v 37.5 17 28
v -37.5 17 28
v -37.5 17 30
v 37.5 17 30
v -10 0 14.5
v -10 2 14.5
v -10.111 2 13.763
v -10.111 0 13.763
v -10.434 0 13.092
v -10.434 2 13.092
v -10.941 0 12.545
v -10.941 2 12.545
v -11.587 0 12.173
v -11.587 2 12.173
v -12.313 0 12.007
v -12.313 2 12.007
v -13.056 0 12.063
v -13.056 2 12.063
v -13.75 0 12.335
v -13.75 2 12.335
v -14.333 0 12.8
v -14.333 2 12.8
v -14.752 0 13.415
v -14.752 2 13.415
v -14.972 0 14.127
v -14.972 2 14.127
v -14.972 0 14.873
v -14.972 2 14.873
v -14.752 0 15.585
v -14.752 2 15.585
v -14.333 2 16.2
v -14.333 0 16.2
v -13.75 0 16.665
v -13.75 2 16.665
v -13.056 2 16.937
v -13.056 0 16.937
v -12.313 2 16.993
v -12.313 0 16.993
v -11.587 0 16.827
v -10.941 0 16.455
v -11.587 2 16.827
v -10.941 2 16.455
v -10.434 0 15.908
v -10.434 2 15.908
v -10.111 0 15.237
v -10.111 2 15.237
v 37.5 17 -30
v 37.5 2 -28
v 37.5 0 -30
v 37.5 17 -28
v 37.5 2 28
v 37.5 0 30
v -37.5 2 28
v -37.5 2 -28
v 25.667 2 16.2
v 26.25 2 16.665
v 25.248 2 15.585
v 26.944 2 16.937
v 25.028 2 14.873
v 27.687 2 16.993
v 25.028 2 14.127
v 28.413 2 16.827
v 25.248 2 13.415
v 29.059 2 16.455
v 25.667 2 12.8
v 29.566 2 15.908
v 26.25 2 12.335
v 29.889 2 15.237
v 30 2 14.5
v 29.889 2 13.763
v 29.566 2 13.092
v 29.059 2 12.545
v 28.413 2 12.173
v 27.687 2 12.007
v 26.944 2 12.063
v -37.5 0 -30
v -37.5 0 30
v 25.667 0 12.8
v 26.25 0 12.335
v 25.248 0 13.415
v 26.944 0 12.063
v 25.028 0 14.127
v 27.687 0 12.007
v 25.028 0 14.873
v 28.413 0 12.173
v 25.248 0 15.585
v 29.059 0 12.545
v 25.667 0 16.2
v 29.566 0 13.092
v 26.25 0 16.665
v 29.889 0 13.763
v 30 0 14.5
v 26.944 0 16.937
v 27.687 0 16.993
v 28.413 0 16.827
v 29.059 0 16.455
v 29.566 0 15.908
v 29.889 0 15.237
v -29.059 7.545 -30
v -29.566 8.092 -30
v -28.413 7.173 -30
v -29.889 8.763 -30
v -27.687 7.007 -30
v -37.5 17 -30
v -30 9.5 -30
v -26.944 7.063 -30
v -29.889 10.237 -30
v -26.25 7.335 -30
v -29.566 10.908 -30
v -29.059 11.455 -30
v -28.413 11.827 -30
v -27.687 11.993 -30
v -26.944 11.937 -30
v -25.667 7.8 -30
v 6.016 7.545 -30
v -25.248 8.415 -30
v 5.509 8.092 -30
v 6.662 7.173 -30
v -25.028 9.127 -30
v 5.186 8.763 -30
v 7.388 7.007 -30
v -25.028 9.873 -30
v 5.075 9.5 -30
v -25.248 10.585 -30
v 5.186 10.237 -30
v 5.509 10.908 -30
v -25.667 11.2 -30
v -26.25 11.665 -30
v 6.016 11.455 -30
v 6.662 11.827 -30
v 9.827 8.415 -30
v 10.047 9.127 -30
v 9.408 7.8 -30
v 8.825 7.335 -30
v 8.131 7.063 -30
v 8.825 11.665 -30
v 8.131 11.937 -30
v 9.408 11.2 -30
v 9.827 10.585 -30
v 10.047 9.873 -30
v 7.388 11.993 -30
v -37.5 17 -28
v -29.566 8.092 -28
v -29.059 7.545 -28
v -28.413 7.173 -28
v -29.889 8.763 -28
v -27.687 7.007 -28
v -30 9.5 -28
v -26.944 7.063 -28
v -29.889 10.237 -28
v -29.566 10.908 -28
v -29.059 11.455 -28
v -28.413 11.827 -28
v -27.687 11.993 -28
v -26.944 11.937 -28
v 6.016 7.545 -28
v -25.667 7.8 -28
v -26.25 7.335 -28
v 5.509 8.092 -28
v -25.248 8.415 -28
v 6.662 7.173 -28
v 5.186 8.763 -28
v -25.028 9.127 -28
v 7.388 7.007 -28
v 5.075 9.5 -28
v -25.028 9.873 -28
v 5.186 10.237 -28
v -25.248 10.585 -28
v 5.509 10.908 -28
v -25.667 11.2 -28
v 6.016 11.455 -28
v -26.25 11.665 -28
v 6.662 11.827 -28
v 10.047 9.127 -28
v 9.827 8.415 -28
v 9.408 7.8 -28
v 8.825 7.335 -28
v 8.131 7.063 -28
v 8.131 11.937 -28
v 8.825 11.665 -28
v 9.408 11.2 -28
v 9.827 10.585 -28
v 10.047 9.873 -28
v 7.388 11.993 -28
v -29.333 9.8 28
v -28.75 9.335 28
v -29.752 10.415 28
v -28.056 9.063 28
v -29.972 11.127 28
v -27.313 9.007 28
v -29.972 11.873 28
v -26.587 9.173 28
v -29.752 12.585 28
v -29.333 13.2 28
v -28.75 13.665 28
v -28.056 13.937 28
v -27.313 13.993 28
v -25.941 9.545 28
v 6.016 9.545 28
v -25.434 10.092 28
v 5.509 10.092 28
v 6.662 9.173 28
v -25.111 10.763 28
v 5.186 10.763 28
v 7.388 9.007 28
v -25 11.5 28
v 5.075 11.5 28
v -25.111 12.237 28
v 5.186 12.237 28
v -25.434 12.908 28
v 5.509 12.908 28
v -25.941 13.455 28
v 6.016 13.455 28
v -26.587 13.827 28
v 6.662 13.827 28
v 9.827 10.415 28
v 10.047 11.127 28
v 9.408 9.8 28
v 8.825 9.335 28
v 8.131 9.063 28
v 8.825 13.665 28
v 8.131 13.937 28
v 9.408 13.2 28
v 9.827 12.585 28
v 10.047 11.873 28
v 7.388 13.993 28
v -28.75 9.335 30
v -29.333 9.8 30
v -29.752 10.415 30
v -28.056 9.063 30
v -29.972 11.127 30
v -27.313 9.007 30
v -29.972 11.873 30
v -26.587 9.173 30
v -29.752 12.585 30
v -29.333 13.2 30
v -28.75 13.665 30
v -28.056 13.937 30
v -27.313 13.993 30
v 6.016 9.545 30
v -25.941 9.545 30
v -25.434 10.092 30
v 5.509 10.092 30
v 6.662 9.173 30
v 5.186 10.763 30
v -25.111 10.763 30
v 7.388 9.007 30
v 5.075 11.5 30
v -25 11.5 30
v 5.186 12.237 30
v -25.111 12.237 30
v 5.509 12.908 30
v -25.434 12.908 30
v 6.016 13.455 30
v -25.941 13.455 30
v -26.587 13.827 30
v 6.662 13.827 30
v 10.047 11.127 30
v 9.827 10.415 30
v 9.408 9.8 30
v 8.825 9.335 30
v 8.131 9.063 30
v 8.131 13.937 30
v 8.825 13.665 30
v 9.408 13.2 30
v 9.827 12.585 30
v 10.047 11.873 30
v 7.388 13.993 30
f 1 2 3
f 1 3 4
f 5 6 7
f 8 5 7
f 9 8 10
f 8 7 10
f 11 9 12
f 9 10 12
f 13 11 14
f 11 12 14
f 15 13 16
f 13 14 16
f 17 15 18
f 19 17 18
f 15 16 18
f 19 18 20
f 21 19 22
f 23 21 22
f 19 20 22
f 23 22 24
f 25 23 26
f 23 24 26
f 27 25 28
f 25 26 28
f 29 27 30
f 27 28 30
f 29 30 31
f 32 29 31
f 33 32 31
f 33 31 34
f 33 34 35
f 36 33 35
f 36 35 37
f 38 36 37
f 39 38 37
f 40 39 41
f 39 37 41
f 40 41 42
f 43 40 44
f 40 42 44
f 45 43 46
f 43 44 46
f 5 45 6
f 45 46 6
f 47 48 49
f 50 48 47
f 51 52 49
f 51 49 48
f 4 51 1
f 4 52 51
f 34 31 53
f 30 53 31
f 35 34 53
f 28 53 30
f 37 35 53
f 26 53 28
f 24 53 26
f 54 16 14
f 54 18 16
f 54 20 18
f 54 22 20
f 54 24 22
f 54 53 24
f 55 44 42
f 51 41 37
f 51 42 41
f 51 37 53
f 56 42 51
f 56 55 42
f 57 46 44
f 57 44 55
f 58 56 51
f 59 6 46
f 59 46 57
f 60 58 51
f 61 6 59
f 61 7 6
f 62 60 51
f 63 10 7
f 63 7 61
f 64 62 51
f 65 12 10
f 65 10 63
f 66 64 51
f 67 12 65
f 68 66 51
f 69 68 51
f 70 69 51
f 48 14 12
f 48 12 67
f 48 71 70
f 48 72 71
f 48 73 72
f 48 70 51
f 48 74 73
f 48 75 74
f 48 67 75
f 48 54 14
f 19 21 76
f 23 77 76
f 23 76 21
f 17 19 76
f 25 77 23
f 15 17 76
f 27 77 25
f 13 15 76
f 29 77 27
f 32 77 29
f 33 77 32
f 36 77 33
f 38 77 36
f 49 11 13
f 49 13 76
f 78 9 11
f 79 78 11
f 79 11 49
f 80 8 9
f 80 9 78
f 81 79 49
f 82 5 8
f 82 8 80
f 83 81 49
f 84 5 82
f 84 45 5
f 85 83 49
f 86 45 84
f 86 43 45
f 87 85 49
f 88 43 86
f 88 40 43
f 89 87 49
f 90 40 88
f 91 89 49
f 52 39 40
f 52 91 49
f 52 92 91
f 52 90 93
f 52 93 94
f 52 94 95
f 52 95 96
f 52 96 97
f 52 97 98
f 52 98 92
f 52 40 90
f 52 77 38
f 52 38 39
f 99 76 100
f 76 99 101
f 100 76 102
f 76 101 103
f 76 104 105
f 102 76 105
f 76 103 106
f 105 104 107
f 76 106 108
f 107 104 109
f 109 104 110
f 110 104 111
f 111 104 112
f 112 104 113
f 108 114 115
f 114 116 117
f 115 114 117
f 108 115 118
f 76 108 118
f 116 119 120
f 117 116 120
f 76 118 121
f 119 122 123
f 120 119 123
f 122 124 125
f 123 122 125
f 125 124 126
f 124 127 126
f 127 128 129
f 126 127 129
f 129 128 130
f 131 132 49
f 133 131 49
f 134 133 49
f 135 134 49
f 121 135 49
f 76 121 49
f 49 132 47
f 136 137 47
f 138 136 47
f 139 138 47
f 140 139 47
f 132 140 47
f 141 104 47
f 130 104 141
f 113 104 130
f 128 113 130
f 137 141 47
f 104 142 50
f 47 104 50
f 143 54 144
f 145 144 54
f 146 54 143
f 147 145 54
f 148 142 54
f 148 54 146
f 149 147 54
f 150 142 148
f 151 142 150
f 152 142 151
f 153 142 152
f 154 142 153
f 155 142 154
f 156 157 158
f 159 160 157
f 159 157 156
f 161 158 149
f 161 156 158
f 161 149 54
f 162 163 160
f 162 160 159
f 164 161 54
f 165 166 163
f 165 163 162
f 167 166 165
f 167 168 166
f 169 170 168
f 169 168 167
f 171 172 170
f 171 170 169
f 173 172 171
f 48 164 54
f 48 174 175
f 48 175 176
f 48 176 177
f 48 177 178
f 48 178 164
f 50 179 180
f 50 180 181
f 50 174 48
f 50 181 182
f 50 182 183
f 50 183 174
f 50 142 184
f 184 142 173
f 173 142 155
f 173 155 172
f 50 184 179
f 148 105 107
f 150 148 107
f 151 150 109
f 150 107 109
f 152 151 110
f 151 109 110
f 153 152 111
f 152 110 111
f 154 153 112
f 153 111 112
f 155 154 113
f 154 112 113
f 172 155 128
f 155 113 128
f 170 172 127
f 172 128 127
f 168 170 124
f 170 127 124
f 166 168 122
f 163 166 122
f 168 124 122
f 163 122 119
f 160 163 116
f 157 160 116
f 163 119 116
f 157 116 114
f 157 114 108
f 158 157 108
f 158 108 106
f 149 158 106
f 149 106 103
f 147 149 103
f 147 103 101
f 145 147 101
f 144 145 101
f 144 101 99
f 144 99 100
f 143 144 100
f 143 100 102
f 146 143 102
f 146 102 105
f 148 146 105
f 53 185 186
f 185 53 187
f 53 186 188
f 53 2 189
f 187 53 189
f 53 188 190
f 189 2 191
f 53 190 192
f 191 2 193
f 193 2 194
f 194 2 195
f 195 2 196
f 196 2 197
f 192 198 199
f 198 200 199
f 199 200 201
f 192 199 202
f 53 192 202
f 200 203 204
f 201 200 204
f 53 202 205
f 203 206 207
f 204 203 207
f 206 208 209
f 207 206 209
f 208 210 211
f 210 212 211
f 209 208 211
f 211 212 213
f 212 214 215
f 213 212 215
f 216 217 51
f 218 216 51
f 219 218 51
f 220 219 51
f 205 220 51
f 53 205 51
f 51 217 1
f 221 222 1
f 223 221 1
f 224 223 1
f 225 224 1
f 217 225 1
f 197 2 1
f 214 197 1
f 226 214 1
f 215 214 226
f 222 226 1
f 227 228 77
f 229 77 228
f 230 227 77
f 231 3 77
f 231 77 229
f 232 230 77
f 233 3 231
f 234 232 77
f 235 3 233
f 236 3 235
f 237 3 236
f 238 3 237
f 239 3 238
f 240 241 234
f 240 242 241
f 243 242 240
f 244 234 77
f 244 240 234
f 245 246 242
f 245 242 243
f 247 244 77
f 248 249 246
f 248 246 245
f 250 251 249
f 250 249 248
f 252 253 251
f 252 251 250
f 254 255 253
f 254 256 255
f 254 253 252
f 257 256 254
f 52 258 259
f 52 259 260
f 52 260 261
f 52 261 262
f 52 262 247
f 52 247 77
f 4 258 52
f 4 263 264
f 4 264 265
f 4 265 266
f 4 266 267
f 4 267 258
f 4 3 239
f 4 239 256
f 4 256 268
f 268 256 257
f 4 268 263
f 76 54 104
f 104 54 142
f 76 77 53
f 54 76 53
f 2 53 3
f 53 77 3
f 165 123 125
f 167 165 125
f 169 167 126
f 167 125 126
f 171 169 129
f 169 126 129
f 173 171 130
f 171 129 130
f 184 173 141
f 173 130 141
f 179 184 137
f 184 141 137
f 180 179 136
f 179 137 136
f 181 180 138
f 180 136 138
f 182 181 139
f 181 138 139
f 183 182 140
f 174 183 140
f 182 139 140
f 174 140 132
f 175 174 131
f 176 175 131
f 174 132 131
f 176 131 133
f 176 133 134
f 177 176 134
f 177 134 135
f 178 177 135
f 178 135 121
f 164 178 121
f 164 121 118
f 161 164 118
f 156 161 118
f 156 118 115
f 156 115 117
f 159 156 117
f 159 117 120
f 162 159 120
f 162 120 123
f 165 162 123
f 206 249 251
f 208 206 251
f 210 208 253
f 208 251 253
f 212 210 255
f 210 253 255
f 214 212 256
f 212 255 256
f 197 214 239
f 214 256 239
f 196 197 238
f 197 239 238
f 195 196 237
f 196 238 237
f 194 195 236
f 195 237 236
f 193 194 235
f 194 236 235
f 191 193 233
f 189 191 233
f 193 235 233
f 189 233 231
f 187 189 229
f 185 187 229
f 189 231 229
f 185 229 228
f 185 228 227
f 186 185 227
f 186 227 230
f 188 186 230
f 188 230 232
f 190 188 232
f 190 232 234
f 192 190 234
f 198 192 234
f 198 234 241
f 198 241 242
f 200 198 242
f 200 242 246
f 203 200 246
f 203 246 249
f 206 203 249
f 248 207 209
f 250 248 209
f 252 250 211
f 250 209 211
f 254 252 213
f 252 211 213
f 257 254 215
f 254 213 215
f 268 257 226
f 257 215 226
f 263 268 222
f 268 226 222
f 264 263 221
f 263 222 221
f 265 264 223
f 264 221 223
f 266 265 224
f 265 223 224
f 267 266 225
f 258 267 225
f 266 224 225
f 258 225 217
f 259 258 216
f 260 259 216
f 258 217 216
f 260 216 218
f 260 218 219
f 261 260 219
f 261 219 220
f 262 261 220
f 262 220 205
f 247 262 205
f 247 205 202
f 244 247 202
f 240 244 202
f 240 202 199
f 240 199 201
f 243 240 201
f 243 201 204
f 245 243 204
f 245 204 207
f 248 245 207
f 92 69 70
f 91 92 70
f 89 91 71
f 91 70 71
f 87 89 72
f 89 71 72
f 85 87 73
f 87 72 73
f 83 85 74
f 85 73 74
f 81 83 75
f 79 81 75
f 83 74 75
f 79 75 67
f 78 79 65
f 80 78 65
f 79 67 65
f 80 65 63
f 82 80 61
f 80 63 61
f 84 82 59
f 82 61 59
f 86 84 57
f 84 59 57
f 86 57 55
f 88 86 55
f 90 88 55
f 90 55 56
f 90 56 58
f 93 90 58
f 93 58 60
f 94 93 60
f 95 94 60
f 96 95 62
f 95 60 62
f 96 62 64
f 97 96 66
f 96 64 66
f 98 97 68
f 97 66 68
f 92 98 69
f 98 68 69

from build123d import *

# Parameters (mm, degrees)
ESBO_O1_W                = 75
ESBO_O1_H                = 56
RESSALTO_EXTRUS_O1_DEPTH = 2
ESBO_O3_W                = 75
ESBO_O3_H                = 17
RESSALTO_EXTRUS_O3_DEPTH = 2
CORTE_EXTRUS_O1_REACH    = 4
ESBO_O4_R                = 2.5
CORTE_EXTRUS_O2_REACH    = 62
ESBO_O5_R                = 2.5
ESBO_O6_R                = 2.5
CORTE_EXTRUS_O3_DEPTH    = 2
CUT_EXTRUDE1_REACH       = 62
SKETCH1_R                = 2.5
CUT_EXTRUDE2_REACH       = 62
SKETCH2_R                = 2.5


with BuildPart() as part:
    # Esboço1 → Ressalto-extrusão1 (new body)
    with BuildSketch(Plane(origin=(0, 0, 0), x_dir=(1, 0, 0), z_dir=(0, 1, 0))):
        Rectangle(ESBO_O1_W, ESBO_O1_H)
    extrude(amount=RESSALTO_EXTRUS_O1_DEPTH)

    # Esboço3 → Ressalto-extrusão3 (add)
    with BuildSketch(Plane.XY.offset(28)):
        with Locations((0, 8.5)):
            Rectangle(ESBO_O3_W, ESBO_O3_H)
    ressalto_extrus_o3 = extrude(amount=RESSALTO_EXTRUS_O3_DEPTH)

    # Espelhar2: Ressalto-extrusão3 across plane
    add(ressalto_extrus_o3.mirror(Plane.XY))

    # Esboço4 → Corte-extrusão1 (cut, up to next)
    with BuildSketch(Plane(origin=(0, 0, 28), x_dir=(-1, 0, 0), z_dir=(0, 0, -1)), mode=Mode.PRIVATE) as corte_extrus_o1_sk1:
        with Locations((-7.575, 11.5)):
            Circle(ESBO_O4_R)
    corte_extrus_o1_tool1 = extrude(corte_extrus_o1_sk1.sketch, amount=-CORTE_EXTRUS_O1_REACH, mode=Mode.PRIVATE) & part.part
    add(corte_extrus_o1_tool1.solids().sort_by_distance((7.575, 11.5, 28))[0], mode=Mode.SUBTRACT)

    # Esboço5 → Corte-extrusão2 (cut, up to next)
    with BuildSketch(Plane.XY.offset(30), mode=Mode.PRIVATE) as corte_extrus_o2_sk1:
        with Locations((-27.5, 11.5)):
            Circle(ESBO_O5_R)
    corte_extrus_o2_tool1 = extrude(corte_extrus_o2_sk1.sketch, amount=-CORTE_EXTRUS_O2_REACH, mode=Mode.PRIVATE) & part.part
    add(corte_extrus_o2_tool1.solids().sort_by_distance((-27.5, 11.5, 30))[0], mode=Mode.SUBTRACT)

    # Esboço6 → Corte-extrusão3 (cut)
    with BuildSketch(Plane(origin=(0, 2, 0), x_dir=(1, 0, 0), z_dir=(0, 1, 0))):
        with Locations((-12.5, -14.5)):
            Circle(ESBO_O6_R)
        with Locations((27.5, -14.5)):
            Circle(ESBO_O6_R)
    extrude(amount=-CORTE_EXTRUS_O3_DEPTH, mode=Mode.SUBTRACT)

    # Sketch1 → Cut-Extrude1 (cut, up to next)
    with BuildSketch(Plane(origin=(0, 0, -30), x_dir=(-1, 0, 0), z_dir=(0, 0, -1)), mode=Mode.PRIVATE) as cut_extrude1_sk1:
        with Locations((-7.575, 9.5)):
            Circle(SKETCH1_R)
    cut_extrude1_tool1 = extrude(cut_extrude1_sk1.sketch, amount=-CUT_EXTRUDE1_REACH, mode=Mode.PRIVATE) & part.part
    add(cut_extrude1_tool1.solids().sort_by_distance((7.575, 9.5, -30))[0], mode=Mode.SUBTRACT)

    # Sketch2 → Cut-Extrude2 (cut, up to next)
    with BuildSketch(Plane(origin=(0, 0, -30), x_dir=(-1, 0, 0), z_dir=(0, 0, -1)), mode=Mode.PRIVATE) as cut_extrude2_sk1:
        with Locations((27.5, 9.5)):
            Circle(SKETCH2_R)
    cut_extrude2_tool1 = extrude(cut_extrude2_sk1.sketch, amount=-CUT_EXTRUDE2_REACH, mode=Mode.PRIVATE) & part.part
    add(cut_extrude2_tool1.solids().sort_by_distance((-27.5, 9.5, -30))[0], mode=Mode.SUBTRACT)


solid = part.part
